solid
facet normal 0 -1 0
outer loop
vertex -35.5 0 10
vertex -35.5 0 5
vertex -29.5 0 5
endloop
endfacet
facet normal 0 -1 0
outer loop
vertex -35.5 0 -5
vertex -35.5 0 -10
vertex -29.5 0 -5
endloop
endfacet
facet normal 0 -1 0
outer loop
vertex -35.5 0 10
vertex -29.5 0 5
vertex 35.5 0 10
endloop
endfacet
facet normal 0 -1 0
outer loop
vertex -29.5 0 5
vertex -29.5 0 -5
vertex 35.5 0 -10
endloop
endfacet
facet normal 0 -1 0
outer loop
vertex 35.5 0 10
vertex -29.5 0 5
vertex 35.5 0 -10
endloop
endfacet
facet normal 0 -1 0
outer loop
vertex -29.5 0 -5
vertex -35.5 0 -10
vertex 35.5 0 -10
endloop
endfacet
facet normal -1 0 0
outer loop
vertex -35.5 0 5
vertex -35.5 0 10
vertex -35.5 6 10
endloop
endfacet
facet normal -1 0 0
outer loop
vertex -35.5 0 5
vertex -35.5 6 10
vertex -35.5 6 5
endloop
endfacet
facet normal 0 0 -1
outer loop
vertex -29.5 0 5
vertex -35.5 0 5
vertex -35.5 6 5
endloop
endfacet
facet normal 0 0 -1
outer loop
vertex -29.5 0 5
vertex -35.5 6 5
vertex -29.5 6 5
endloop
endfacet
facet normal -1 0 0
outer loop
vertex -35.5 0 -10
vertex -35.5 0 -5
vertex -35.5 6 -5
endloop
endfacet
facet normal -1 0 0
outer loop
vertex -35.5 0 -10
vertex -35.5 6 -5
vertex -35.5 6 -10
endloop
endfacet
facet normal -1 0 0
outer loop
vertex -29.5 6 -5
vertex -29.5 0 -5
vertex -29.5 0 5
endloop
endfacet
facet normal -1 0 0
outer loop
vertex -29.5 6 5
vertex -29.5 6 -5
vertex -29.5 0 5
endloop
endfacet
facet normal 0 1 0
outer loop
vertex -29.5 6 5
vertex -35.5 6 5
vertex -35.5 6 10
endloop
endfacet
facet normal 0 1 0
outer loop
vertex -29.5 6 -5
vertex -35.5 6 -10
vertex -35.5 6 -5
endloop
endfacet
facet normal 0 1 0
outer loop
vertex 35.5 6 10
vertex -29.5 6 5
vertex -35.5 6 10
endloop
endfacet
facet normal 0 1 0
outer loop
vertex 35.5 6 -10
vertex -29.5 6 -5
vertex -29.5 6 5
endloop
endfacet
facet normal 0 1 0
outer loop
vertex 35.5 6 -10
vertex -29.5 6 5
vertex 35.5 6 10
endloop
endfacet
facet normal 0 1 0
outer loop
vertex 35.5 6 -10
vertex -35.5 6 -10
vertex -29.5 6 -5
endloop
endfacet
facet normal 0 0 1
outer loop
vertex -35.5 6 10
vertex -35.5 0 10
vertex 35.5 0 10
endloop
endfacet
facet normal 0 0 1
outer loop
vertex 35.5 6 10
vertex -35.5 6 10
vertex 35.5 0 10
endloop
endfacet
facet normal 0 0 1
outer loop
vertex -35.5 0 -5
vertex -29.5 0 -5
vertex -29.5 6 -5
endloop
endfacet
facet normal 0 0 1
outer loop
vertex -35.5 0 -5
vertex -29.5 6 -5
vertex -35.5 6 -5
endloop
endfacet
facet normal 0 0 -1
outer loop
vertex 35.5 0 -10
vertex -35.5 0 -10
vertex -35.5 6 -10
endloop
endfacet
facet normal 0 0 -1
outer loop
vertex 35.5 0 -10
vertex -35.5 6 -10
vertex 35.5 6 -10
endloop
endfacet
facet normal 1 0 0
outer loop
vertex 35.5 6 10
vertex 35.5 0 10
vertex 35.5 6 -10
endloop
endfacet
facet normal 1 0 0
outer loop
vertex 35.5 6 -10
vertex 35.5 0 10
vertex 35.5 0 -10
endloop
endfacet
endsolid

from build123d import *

# Parameters (mm, degrees)
SKETCH1_W           = 71
SKETCH1_H           = 20
BOSS_EXTRUDE1_DEPTH = 6
CUT_EXTRUDE1_DEPTH  = 7


with BuildPart() as part:
    # Sketch1 → Boss-Extrude1 (new body)
    with BuildSketch(Plane(origin=(0, 0, 0), x_dir=(1, 0, 0), z_dir=(0, 1, 0))):
        Rectangle(SKETCH1_W, SKETCH1_H)
    extrude(amount=BOSS_EXTRUDE1_DEPTH)

    # Sketch4 → Cut-Extrude1 (cut, through all)
    with BuildSketch(Plane.XZ):
        Polygon((-35.5, 5), (-29.5, 5), (-29.5, 0), (-29.5, -5), (-35.5, -5), align=None)
    extrude(amount=-CUT_EXTRUDE1_DEPTH, mode=Mode.SUBTRACT)


solid = part.part
